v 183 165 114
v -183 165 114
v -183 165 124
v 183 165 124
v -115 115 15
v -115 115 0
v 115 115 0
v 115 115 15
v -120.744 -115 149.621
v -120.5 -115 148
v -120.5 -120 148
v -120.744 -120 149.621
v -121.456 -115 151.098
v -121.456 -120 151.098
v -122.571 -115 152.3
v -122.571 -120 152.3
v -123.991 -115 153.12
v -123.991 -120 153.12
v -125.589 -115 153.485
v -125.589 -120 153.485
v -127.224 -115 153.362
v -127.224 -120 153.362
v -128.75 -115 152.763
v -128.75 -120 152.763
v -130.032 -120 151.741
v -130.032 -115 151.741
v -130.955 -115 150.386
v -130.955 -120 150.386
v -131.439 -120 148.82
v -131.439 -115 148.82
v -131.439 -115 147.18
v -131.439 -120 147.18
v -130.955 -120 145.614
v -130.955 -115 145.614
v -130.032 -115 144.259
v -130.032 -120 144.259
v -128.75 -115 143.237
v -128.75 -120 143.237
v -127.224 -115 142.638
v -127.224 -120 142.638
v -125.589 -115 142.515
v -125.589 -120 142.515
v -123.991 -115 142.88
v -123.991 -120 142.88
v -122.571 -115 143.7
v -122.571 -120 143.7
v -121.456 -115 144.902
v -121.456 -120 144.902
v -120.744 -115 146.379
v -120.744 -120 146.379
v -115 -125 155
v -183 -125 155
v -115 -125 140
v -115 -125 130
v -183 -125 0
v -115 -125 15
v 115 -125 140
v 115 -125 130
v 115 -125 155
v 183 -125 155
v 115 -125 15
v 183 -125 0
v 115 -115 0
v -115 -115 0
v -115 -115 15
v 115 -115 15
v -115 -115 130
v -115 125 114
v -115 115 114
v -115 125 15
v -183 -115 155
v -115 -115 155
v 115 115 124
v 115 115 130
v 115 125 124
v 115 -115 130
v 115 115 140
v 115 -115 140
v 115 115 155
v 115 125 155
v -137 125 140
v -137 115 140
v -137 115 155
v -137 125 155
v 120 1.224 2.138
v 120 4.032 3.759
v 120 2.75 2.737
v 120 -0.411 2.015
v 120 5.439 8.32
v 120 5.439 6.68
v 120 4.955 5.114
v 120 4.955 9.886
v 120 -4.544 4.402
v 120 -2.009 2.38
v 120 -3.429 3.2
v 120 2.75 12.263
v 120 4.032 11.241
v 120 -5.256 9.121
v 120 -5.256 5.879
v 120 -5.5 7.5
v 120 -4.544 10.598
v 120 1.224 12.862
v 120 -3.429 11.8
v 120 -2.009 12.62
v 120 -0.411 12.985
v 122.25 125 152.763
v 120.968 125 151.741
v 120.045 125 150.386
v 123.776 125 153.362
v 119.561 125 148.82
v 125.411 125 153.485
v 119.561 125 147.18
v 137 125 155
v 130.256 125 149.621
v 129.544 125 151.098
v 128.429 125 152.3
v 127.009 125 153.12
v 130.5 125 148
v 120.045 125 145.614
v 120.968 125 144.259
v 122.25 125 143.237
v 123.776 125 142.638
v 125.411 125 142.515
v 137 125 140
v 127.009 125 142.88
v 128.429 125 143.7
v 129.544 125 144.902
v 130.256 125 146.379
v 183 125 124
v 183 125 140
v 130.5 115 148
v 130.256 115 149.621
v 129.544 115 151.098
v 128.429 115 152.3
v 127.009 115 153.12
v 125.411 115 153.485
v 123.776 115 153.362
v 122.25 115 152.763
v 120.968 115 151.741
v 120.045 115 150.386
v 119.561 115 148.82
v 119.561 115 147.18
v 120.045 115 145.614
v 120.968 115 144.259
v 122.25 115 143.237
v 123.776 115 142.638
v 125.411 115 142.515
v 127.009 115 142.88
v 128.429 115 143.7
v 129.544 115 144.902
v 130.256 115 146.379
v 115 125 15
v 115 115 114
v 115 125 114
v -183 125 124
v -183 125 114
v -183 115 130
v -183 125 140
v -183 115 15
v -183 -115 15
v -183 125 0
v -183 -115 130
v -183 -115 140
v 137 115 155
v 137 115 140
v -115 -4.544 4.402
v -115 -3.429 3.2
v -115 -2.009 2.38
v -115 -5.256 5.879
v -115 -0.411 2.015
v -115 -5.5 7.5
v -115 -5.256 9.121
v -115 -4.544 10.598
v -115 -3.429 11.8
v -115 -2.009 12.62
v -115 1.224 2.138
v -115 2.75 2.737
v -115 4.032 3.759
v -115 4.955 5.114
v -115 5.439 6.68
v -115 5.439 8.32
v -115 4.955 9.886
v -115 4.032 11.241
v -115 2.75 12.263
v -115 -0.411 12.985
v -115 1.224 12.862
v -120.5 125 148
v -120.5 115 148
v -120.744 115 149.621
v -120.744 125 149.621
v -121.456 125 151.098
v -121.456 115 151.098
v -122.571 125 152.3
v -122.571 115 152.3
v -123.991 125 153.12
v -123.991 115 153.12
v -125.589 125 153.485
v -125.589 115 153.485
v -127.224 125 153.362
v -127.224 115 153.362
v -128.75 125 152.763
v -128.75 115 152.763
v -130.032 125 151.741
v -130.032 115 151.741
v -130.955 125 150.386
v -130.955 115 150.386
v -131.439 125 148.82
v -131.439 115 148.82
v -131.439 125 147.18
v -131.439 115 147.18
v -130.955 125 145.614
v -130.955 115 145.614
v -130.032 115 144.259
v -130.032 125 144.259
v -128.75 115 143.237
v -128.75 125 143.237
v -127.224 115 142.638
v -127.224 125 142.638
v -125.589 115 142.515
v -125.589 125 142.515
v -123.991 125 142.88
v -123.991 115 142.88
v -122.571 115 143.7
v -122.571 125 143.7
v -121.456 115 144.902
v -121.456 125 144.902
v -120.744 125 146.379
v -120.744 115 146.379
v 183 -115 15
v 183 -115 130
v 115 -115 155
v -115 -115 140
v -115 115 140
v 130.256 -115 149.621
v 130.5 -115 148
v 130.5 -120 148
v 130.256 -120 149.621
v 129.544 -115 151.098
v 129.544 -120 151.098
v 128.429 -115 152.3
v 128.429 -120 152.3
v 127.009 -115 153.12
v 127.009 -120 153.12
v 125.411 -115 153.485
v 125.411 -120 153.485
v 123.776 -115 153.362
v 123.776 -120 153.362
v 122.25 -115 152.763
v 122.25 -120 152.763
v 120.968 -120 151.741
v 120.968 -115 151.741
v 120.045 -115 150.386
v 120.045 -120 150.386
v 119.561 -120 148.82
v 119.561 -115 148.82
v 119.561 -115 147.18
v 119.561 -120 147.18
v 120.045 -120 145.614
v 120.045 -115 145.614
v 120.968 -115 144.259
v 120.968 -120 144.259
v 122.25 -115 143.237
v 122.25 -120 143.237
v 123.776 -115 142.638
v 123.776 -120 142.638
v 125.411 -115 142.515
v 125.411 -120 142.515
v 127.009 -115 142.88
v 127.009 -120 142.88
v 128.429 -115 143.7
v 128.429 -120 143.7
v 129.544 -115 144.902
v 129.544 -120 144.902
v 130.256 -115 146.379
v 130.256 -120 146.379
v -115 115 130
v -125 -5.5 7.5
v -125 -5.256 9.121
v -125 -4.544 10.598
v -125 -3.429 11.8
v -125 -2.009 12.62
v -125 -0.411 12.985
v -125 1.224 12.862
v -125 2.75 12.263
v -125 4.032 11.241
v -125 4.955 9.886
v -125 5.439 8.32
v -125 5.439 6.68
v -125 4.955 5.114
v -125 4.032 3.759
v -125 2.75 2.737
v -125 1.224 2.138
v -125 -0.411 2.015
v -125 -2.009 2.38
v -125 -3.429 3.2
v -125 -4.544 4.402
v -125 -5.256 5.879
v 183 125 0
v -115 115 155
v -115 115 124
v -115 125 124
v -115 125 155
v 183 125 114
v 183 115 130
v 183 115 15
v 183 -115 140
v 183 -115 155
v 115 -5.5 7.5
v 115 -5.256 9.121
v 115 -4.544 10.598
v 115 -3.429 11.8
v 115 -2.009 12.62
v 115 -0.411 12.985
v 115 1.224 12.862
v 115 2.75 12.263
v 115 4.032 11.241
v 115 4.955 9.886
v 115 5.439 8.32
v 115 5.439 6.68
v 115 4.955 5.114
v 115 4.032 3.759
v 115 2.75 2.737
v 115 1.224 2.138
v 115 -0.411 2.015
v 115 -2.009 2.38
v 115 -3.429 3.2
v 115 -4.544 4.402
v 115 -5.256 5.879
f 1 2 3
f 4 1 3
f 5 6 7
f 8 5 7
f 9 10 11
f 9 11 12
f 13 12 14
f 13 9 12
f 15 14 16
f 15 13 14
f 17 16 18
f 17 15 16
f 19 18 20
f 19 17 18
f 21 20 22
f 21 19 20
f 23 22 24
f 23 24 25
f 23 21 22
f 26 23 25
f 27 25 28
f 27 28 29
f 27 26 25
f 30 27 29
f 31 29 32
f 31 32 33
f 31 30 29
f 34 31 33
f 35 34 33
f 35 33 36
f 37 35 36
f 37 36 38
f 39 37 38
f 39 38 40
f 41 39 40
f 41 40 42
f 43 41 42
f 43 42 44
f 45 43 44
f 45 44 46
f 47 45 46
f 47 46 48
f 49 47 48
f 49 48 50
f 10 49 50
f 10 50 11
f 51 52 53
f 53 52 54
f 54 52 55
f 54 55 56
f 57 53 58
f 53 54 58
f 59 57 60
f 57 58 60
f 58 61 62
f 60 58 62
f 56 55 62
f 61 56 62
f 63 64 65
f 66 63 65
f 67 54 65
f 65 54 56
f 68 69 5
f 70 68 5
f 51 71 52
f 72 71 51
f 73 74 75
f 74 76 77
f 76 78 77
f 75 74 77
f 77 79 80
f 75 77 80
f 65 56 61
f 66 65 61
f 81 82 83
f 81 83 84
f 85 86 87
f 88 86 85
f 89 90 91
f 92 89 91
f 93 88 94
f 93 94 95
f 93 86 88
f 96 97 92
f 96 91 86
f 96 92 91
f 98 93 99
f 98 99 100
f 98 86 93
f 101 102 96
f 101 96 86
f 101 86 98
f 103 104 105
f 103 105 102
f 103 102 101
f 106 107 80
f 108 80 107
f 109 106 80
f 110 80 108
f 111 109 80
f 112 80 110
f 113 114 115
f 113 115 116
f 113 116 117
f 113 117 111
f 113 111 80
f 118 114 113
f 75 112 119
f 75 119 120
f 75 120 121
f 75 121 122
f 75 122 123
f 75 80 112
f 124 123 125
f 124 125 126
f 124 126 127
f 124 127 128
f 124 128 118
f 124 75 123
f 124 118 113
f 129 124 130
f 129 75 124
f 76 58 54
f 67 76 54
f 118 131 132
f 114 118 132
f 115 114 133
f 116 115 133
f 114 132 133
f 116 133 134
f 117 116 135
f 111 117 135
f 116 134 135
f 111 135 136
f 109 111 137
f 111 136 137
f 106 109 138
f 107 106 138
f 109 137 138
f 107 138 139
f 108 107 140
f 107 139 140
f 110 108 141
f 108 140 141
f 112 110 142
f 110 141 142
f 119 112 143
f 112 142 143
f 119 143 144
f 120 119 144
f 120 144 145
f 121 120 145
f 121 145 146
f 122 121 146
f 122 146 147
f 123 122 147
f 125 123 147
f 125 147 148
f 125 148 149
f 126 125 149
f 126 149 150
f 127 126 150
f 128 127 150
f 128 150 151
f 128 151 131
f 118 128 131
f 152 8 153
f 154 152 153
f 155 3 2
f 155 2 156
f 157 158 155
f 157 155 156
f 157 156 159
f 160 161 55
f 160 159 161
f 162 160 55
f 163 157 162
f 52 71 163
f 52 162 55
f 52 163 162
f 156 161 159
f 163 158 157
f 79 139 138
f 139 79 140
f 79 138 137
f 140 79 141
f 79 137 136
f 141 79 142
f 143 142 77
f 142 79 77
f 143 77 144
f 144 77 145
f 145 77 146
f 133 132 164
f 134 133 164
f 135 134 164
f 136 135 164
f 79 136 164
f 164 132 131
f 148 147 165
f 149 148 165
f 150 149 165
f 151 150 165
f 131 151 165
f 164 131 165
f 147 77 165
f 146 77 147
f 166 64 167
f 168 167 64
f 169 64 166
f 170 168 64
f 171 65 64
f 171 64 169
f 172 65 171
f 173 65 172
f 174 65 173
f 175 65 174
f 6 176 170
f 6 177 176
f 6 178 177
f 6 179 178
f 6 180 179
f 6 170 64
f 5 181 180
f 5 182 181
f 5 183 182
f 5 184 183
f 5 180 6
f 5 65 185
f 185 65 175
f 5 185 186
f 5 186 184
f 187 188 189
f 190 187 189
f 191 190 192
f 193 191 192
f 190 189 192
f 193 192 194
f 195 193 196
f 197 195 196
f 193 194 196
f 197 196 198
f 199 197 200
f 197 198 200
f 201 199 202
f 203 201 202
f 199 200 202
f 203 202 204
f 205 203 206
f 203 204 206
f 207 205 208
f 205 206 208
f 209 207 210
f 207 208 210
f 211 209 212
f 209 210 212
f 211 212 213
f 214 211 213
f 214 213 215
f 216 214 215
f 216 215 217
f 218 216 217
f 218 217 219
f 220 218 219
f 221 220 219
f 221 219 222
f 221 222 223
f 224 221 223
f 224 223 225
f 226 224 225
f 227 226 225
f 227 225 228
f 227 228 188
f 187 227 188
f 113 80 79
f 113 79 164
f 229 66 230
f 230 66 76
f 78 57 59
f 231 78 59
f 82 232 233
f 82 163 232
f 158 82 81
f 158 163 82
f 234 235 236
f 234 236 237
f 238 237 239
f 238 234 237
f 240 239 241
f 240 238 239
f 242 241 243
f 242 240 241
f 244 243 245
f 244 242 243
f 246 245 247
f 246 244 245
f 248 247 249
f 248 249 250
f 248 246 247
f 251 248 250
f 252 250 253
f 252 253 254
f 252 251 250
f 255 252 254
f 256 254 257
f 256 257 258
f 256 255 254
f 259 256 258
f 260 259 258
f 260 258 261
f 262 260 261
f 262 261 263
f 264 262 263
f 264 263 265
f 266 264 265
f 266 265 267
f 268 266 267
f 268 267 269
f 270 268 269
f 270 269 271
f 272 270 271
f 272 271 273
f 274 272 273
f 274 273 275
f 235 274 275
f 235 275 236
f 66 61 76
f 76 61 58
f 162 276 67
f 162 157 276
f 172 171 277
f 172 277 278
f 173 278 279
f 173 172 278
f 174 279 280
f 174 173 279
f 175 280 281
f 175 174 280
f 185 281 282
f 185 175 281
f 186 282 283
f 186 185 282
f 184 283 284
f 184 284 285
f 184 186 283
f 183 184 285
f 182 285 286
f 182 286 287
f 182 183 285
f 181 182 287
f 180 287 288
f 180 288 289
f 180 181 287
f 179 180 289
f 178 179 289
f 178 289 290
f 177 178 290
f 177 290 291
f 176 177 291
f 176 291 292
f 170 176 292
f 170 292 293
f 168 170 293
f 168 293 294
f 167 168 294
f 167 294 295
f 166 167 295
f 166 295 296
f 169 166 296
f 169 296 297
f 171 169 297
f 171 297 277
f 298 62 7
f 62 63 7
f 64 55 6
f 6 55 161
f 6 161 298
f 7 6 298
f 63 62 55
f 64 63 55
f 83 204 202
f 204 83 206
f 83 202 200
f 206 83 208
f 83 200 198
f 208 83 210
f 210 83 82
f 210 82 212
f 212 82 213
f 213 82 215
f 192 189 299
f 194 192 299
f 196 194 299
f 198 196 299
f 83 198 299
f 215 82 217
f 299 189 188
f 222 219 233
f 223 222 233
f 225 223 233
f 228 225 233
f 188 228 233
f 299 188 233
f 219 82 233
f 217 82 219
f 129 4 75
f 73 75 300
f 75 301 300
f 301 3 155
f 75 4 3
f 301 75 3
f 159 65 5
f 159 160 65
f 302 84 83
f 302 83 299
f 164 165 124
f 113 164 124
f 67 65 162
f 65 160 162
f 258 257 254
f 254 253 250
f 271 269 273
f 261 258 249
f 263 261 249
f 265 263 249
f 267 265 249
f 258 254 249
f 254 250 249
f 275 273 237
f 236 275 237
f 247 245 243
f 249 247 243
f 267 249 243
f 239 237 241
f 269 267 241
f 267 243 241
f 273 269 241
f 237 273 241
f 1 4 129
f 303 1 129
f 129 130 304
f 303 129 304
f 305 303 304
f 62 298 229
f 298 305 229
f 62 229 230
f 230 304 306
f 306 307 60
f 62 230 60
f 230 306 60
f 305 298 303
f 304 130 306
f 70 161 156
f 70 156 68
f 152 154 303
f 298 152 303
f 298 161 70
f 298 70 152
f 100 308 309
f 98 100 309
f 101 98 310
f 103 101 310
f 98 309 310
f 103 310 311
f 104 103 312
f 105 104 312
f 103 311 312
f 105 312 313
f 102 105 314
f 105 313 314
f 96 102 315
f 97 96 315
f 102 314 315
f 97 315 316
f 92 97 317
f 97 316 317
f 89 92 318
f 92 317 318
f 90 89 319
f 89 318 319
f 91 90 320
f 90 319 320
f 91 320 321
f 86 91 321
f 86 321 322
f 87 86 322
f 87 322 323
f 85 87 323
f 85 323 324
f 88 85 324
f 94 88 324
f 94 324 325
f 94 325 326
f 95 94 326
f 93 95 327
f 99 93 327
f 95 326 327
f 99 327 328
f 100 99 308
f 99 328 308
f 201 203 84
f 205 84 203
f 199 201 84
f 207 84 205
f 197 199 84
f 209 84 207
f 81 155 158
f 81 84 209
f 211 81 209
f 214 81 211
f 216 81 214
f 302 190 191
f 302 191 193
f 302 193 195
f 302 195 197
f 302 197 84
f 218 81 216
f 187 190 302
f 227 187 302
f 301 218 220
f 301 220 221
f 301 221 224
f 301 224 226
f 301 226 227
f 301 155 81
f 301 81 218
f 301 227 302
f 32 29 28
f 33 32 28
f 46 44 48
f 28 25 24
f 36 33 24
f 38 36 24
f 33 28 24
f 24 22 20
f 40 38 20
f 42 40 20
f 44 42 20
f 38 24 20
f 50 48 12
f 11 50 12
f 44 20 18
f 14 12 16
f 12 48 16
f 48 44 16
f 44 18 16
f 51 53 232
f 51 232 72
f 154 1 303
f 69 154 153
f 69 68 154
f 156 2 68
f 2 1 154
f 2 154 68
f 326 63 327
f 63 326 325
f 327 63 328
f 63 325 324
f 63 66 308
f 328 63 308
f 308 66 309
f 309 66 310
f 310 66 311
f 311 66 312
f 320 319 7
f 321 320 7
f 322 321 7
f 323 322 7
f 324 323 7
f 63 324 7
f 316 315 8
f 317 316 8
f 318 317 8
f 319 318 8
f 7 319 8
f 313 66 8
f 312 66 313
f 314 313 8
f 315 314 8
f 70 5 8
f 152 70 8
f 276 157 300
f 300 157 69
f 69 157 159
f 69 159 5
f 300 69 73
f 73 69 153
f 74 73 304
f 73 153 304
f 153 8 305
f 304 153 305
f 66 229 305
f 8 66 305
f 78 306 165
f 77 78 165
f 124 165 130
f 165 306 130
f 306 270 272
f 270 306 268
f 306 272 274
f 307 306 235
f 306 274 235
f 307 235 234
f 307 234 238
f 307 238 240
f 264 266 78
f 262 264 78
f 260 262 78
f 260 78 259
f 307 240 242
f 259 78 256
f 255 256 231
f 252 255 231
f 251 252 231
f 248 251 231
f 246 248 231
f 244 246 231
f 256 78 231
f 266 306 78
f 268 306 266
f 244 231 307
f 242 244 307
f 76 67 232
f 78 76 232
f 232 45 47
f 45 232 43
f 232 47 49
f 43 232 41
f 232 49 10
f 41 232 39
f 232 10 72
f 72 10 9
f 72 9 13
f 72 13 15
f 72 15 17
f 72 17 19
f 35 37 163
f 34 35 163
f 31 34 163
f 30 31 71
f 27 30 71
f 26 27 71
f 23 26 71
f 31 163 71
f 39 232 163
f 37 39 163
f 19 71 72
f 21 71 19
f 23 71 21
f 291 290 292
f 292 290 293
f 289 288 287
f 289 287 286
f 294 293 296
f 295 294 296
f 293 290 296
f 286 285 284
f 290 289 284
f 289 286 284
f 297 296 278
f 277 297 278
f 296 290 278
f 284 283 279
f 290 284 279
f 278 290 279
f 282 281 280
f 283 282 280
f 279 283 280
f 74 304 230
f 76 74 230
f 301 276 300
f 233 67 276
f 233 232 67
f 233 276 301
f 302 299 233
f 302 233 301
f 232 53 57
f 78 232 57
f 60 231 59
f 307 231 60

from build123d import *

# Parameters (mm, degrees)
F0_W      = 366
F0_H      = 250
F1_DEPTH  = 155
F2_T      = -10
F3_W      = 346
F3_H      = 230
F4_DEPTH  = 25
F5_W      = 230
F5_H      = 15
F6_DEPTH  = 500
F7_W      = 240
F7_H      = 15
F8_DEPTH  = 500
F9_W      = 50
F9_H      = 10
F10_DEPTH = 366
F11_W     = 230
F11_H     = 6
F11_H_2   = 10
F12_DEPTH = 200
F13_W     = 22
F13_H     = 10
F14_DEPTH = 15
F15_W     = 22
F15_H     = 10
F16_DEPTH = 15
F17_DEPTH = 58
F18_DEPTH = 58
F19_DEPTH = 58
F20_DEPTH = 58
F21_R     = 5.5
F22_DEPTH = 235
F23_R     = 5.5
F24_DEPTH = 25
F25_R     = 5.5
F26_DEPTH = 240
F27_DEPTH = 260
F28_R     = 5.5
F29_DEPTH = 235
F30_R     = 5.5
F31_DEPTH = 5


with BuildPart() as f1:
    # F0 (on Top) → F1 (new body)
    with BuildSketch(Plane.XY):
        Rectangle(F0_W, F0_H)
    extrude(amount=F1_DEPTH)

    # F2
    f2_openings = [f1.faces().sort_by_distance(p)[0] for p in [
        (0, 0, 155),
    ]]
    offset(amount=F2_T, openings=f2_openings)

    # F3 (on face) → F4 (cut)
    with BuildSketch(Plane.XY.offset(10)):
        Rectangle(F3_W, F3_H)
    extrude(amount=-F4_DEPTH, mode=Mode.SUBTRACT)

    # F5 (on face) → F6 (cut)
    with BuildSketch(Plane.XZ.offset(125)):
        Polygon((115, 130), (-115, 130), (-115, 15), (0, 15), (115, 15), align=None)
        with Locations((0, 147.5)):
            Rectangle(F5_W, F5_H)
    extrude(amount=-F6_DEPTH, mode=Mode.SUBTRACT)

    # F7 (on face) → F8 (cut)
    with BuildSketch(Plane(origin=(-183, 0, 0), x_dir=(0, -1, 0), z_dir=(-1, 0, 0))):
        with Locations((-5, 147.5)):
            Rectangle(F7_W, F7_H)
        Polygon((-115, 15), (0, 15), (115, 15), (115, 130), (-115, 130), align=None)
    extrude(amount=-F8_DEPTH, mode=Mode.SUBTRACT)

    # F9 (on face) → F10 (join, through all)
    with BuildSketch(Plane(origin=(-183, 0, 0), x_dir=(0, -1, 0), z_dir=(-1, 0, 0))):
        with Locations((-140, 119)):
            Rectangle(F9_W, F9_H)
    extrude(amount=-F10_DEPTH)

    # F11 (on face) → F12 (cut)
    with BuildSketch(Plane(origin=(0, 125, 0), x_dir=(-1, 0, 0), z_dir=(0, 1, 0))):
        with Locations((0, 127)):
            Rectangle(F11_W, F11_H)
        with Locations((0, 135)):
            Rectangle(F11_W, F11_H_2)
    extrude(amount=-F12_DEPTH, mode=Mode.SUBTRACT)

    # F13 (on face) → F14 (join)
    with BuildSketch(Plane.XY.offset(140)):
        with Locations((126, 120)):
            Rectangle(F13_W, F13_H)
    extrude(amount=F14_DEPTH)

    # F15 (on face) → F16 (join)
    with BuildSketch(Plane.XY.offset(140)):
        with Locations((-126, 120)):
            Rectangle(F15_W, F15_H)
    extrude(amount=F16_DEPTH)

    # F17 (add, through all): a face of the model
    f17_faces = [f1.faces().sort_by_distance(p)[0] for p in [
        (173, 0, 135),
    ]]
    extrude(f17_faces, amount=F17_DEPTH)

    # F18 (add, through all): a face of the model
    f18_faces = [f1.faces().sort_by_distance(p)[0] for p in [
        (-173, 0, 135),
    ]]
    extrude(f18_faces, amount=F18_DEPTH)

    # F19 (add, through all): a face of the model
    f19_faces = [f1.faces().sort_by_distance(p)[0] for p in [
        (173, 0, 7.5),
    ]]
    extrude(f19_faces, amount=F19_DEPTH)

    # F20 (add, through all): a face of the model
    f20_faces = [f1.faces().sort_by_distance(p)[0] for p in [
        (-173, 0, 7.5),
    ]]
    extrude(f20_faces, amount=F20_DEPTH)

    # F21 (on face) → F22 (cut)
    with BuildSketch(Plane.XZ.offset(-115)):
        with Locations((125, 148)):
            Circle(F21_R)
    extrude(amount=F22_DEPTH, mode=Mode.SUBTRACT)

    # F23 (on face) → F24 (cut)
    with BuildSketch(Plane.XZ.offset(-115)):
        with Locations((-126, 148)):
            Circle(F23_R)
    extrude(amount=-F24_DEPTH, mode=Mode.SUBTRACT)

    # F25 (on face) → F26 (cut)
    with BuildSketch(Plane(origin=(115, 0, 0), x_dir=(0, -1, 0), z_dir=(-1, 0, 0))):
        with Locations((0, 7.5)):
            Circle(F25_R)
    extrude(amount=F26_DEPTH, mode=Mode.SUBTRACT)

    # F27 (cut): a face of the model
    f27_faces = [f1.faces().sort_by_distance(p)[0] for p in [
        (125, -120, 148),
    ]]
    extrude(f27_faces, amount=F27_DEPTH, mode=Mode.SUBTRACT)

    # F28 (on face) → F29 (cut)
    with BuildSketch(Plane.XZ.offset(-115)):
        with Locations((-126, 148)):
            Circle(F28_R)
    extrude(amount=F29_DEPTH, mode=Mode.SUBTRACT)

    # F30 (on face) → F31 (cut)
    with BuildSketch(Plane(origin=(115, 0, 0), x_dir=(0, -1, 0), z_dir=(-1, 0, 0))):
        with Locations((0, 7.5)):
            Circle(F30_R)
    extrude(amount=-F31_DEPTH, mode=Mode.SUBTRACT)


solid = f1.part
